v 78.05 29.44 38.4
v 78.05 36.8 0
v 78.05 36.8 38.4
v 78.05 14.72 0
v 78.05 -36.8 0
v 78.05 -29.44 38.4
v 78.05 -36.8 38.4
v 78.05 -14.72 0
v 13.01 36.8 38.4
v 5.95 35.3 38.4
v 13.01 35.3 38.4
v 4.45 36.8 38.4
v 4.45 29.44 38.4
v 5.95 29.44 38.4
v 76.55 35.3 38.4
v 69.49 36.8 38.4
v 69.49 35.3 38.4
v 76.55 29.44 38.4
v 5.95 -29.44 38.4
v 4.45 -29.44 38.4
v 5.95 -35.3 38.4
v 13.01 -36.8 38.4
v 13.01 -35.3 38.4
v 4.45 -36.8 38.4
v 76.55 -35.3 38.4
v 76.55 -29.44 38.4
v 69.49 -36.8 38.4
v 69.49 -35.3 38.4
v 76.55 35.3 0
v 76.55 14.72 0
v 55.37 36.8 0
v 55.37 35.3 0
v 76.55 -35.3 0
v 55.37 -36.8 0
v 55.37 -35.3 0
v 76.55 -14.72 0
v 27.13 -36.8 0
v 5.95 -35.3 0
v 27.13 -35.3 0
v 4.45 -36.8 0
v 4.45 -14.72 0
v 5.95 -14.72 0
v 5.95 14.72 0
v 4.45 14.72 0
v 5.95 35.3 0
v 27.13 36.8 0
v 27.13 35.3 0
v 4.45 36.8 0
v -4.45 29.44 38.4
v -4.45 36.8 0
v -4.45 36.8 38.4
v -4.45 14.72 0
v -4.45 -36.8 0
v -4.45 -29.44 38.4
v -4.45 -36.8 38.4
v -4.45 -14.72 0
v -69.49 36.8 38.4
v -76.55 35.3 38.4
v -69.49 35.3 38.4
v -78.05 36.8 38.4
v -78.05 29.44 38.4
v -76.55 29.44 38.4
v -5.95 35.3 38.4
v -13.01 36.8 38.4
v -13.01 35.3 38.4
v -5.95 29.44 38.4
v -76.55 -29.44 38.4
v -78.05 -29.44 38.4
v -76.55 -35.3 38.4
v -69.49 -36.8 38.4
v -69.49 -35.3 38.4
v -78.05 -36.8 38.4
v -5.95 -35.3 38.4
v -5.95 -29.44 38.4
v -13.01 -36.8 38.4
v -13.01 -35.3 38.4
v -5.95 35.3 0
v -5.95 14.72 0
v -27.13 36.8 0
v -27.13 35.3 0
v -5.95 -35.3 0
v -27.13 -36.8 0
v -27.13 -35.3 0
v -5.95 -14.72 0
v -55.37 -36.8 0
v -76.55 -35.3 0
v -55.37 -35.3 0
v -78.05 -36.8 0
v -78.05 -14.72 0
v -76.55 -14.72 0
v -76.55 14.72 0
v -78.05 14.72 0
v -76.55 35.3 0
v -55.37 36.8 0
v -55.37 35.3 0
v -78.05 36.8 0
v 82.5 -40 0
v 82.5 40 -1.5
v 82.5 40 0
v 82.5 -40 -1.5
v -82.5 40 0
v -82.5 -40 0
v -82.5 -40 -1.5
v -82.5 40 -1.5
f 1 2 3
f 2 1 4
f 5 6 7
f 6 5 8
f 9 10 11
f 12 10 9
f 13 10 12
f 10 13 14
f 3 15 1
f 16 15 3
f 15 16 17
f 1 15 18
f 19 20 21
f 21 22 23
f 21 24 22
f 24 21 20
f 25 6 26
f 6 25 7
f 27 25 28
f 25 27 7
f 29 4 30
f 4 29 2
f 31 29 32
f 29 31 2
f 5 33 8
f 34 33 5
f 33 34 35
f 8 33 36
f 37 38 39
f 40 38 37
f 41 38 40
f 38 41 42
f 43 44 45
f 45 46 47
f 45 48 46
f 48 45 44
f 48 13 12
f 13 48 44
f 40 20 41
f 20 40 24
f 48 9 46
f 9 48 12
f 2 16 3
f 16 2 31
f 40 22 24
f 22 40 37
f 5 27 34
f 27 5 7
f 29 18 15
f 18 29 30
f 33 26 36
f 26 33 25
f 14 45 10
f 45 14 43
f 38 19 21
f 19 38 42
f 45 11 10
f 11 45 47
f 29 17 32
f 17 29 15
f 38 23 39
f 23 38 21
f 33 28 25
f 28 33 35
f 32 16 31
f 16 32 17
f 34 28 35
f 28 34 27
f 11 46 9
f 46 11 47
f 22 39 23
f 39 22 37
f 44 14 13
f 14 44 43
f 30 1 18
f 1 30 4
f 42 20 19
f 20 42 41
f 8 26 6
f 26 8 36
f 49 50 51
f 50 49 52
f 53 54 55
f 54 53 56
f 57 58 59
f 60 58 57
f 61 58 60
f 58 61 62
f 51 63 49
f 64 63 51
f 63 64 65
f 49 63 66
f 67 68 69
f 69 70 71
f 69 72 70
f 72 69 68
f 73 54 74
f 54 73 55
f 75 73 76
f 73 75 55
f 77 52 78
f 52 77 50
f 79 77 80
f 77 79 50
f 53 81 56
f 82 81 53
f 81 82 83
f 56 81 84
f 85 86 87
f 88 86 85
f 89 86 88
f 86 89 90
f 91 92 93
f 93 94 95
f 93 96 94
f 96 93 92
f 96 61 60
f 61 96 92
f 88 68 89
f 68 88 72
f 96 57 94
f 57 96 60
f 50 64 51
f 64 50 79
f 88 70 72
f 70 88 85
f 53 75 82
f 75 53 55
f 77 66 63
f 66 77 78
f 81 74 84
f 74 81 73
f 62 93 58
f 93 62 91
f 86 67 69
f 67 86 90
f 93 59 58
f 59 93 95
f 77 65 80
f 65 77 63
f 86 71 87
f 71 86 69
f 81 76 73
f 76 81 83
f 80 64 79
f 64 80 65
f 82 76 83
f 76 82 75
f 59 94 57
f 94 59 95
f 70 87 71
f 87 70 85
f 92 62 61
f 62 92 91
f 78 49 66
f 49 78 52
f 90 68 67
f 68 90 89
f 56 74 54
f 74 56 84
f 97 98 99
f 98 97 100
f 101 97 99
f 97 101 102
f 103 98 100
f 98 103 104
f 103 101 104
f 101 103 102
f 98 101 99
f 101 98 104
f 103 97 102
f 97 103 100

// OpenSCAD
longueur_boite = 165;
largeur_boite_1 = 80;
largeur_boite_2 = 144;
epaisseur = 1.5;
longueur_tuile = 69.6;
largeur_tuile = 69.6;
nb_tuiles = 16;
longueur_carte_role = 44.9;
largeur_carte_role = 34.8;
nb_carte_role = 6;
longueur_pion = 29.7;
largeur_pion = 16.8;
nb_pion = 6;
longueur_carte_fleche = 24.9;
largeur_carte_fleche = 15.8;
nb_carte_fleche = 6;
longueur_carte_action = 31.7;
largeur_carte_action = 31.7;
nb_carte_action = 4;
longueur_compte_rebour = 140;
largeur_compte_rebour = 60;
longueur_dice = 17.5;
diametre_jeton = 22;
nb_jetons = 6;
epaisseur_carte = 2.4;
espace = 5;
marge = 0.5;
detail = 100;


module plateau(longueur, largeur, epaisseur){
	cube([longueur, largeur, epaisseur], center = true);
}

module bloc_carte(longueur_carte, largeur_carte, hauteur_bloc, epaisseur){
	difference(){
		cube([longueur_carte+2*epaisseur, largeur_carte+2*epaisseur, hauteur_bloc], center=true);
		cube([longueur_carte, largeur_carte, 2*hauteur_bloc], center=true);
		triangle_decoupe(largeur_carte+3*epaisseur, longueur_carte, 2*hauteur_bloc);
		rotate([0,0,90]) triangle_decoupe(longueur_carte+3*epaisseur, largeur_carte+2*epaisseur, 2*hauteur_bloc);
	}
}

module bloc_pieces(longueur, largeur, hauteur, epaisseur){
	difference(){
		cube([longueur+2*epaisseur, largeur+2*epaisseur, hauteur], center=true);
		cube([longueur, largeur, 2*hauteur], center=true);
	}
}

module cylindre_carte(diametre_carte, hauteur_bloc, epaisseur){
	difference(){
		cylinder(h=hauteur_bloc, r=diametre_carte/2+epaisseur, $fn=detail, center=true);
		cylinder(h=2*hauteur_bloc, r=diametre_carte/2, $fn=detail, center=true);
		rectangle_decoupe(diametre_carte+3*epaisseur, (diametre_carte+2*epaisseur)/2, 4*hauteur_bloc);
		rotate([0,0,90]) rectangle_decoupe(diametre_carte+3*epaisseur, (diametre_carte+2*epaisseur)/2, 4*hauteur_bloc);
	}
}

module bloc_compte_rebour(longueur_carte, largeur_carte, hauteur_bloc, hauteur_support, epaisseur){
	difference(){
		bloc_carte(longueur_carte-4*epaisseur, largeur_carte-4*epaisseur, hauteur_bloc+hauteur_support, 3*epaisseur);
		translate([0,0, hauteur_support/2]) cube([longueur_carte,largeur_carte,hauteur_bloc], center=true);
	}
}

module triangle_decoupe(longueur, largeur, hauteur){
	translate([-largeur/2,0,hauteur/2]) rotate([-90,0,0]) linear_extrude(height=longueur, center=true) polygon(points=[[0,0],[largeur,0],[largeur/2,5*hauteur/4]], paths=[[0,1,2]]);
}

module rectangle_decoupe(longueur, largeur, hauteur){
	cube([largeur, longueur, hauteur], center = true);
}

module rangement1(){
	hauteur_bloc = nb_tuiles*epaisseur_carte;
	union(){
		translate([0,0,-epaisseur/2]) plateau(longueur_boite, largeur_boite_1, epaisseur);
		translate([(longueur_tuile+2*marge+2*epaisseur)/2+((longueur_boite/2)-(longueur_tuile+2*marge+2*epaisseur))/2,0,hauteur_bloc/2]) bloc_carte(longueur_tuile+2*marge, largeur_tuile+2*marge, hauteur_bloc, epaisseur);
		translate([-(longueur_tuile+2*marge+2*epaisseur)/2-((longueur_boite/2)-(longueur_tuile+2*marge+2*epaisseur))/2,0,hauteur_bloc/2]) bloc_carte(longueur_tuile+2*marge, largeur_tuile+2*marge, hauteur_bloc, epaisseur);
	}
}

module rangement2(){
	hauteur_support_bloc_compte_rebour = (nb_carte_role+1)*epaisseur_carte;
	hauteur_bloc_carte_role = nb_carte_role*epaisseur_carte;
	longueur_bloc_figurines = (longueur_compte_rebour-2*epaisseur)-(longueur_carte_role+2*epaisseur)-2*espace;
	largeur_bloc_figurines = (largeur_compte_rebour-2*epaisseur)-2*espace;
	largeur_bloc_carte_action = nb_carte_action*epaisseur_carte+2*marge;
	espace_carte_action = (longueur_boite-6*(largeur_bloc_carte_action+2*epaisseur))/7;
	hauteur_bloc_jetons = nb_jetons*epaisseur_carte;
	hauteur_bloc_pion = nb_pion*epaisseur_carte;
	
	position_compte_rebour_y = espace+(largeur_compte_rebour+3*epaisseur-(largeur_boite_2+epaisseur))/2;
	position_carte_role_x = espace+((longueur_carte_role+epaisseur)-(longueur_compte_rebour+3*epaisseur))/2;
	position_carte_role_y = position_compte_rebour_y;
	position_bloc_figurines_x = (longueur_compte_rebour+3*epaisseur)/2 - espace-(longueur_carte_role+epaisseur);
	position_bloc_figurines_y = position_carte_role_y;

	position_carte_action1_x = espace_carte_action+(largeur_bloc_carte_action+2*epaisseur)/2-longueur_boite/2;
	position_carte_action2_x = position_carte_action1_x+espace_carte_action+(largeur_bloc_carte_action+2*epaisseur);
	position_carte_action3_x = position_carte_action2_x+espace_carte_action+(largeur_bloc_carte_action+2*epaisseur);
	position_carte_action4_x = position_carte_action3_x+espace_carte_action+(largeur_bloc_carte_action+2*epaisseur);
	position_carte_action5_x = position_carte_action4_x+espace_carte_action+(largeur_bloc_carte_action+2*epaisseur);
	position_carte_action6_x = position_carte_action5_x+espace_carte_action+(largeur_bloc_carte_action+2*epaisseur);
	position_carte_action_y = largeur_boite_2/2-espace-(longueur_carte_action+2*epaisseur)/2;

	espace_ligne_2 = (longueur_boite-(diametre_jeton+2*epaisseur+2*marge)-(longueur_pion+2*epaisseur+2*marge)-(largeur_carte_fleche+2*epaisseur+2*marge)-(longueur_dice+2*epaisseur+2*marge))/5;
	position_jeton_x = espace_ligne_2+(diametre_jeton+2*epaisseur)/2-longueur_boite/2;
	position_jeton_y = position_carte_action_y-(longueur_carte_action+2*epaisseur)/2-(diametre_jeton+2*epaisseur)/2-espace;
	position_pion_x = position_jeton_x+(diametre_jeton+2*epaisseur+2*marge)/2+(longueur_pion+2*epaisseur+2*marge)/2+espace_ligne_2;
	position_pion_y = position_jeton_y;
	position_carte_fleche_x = position_pion_x+(largeur_pion+2*epaisseur+2*marge)/2+(largeur_carte_fleche+2*epaisseur+2*marge)/2+espace_ligne_2;
	position_carte_fleche_y = position_jeton_y;
	position_dice_x = position_carte_fleche_x+(largeur_carte_fleche+2*epaisseur+2*marge)/2+(longueur_dice+2*epaisseur+2*marge)/2+espace_ligne_2;
	position_dice_y = position_jeton_y;
	
	union(){
		translate([0,0,-epaisseur/2]) plateau(longueur_boite, largeur_boite_2, epaisseur);
		translate([0,position_compte_rebour_y,(nb_carte_role+4)*epaisseur_carte/2]) color("blue") bloc_compte_rebour(longueur_compte_rebour+2*marge, largeur_compte_rebour+2*marge, 3*epaisseur_carte, hauteur_support_bloc_compte_rebour, epaisseur);
		translate([position_carte_role_x,position_carte_role_y,hauteur_bloc_carte_role/2]) rotate([0,0,90]) color("green") bloc_carte(longueur_carte_role+2*marge, largeur_carte_role+2*marge, hauteur_bloc_carte_role, epaisseur);
		translate([position_bloc_figurines_x,position_bloc_figurines_y,hauteur_bloc_carte_role/2]) bloc_pieces(longueur_bloc_figurines, largeur_bloc_figurines, hauteur_bloc_carte_role, epaisseur);

		// Cartes action
		translate([position_carte_action1_x, position_carte_action_y, largeur_carte_action/2]) rotate([0,0,90]) color("red") bloc_carte(longueur_carte_action+2*marge, largeur_bloc_carte_action, largeur_carte_action, epaisseur);
		translate([position_carte_action2_x, position_carte_action_y, largeur_carte_action/2]) rotate([0,0,90]) color("red") bloc_carte(longueur_carte_action+2*marge, largeur_bloc_carte_action, largeur_carte_action, epaisseur);
		translate([position_carte_action3_x, position_carte_action_y, largeur_carte_action/2]) rotate([0,0,90]) color("red") bloc_carte(longueur_carte_action+2*marge, largeur_bloc_carte_action, largeur_carte_action, epaisseur);
		translate([position_carte_action4_x, position_carte_action_y, largeur_carte_action/2]) rotate([0,0,90]) color("red") bloc_carte(longueur_carte_action+2*marge, largeur_bloc_carte_action, largeur_carte_action, epaisseur);
		translate([position_carte_action5_x, position_carte_action_y, largeur_carte_action/2]) rotate([0,0,90]) color("red") bloc_carte(longueur_carte_action+2*marge, largeur_bloc_carte_action, largeur_carte_action, epaisseur);
		translate([position_carte_action6_x, position_carte_action_y, largeur_carte_action/2]) rotate([0,0,90]) color("red") bloc_carte(longueur_carte_action+2*marge, largeur_bloc_carte_action, largeur_carte_action, epaisseur);
		
		// Jeton
		translate([position_jeton_x,position_jeton_y,hauteur_bloc_jetons/2])cylindre_carte(diametre_jeton+2*marge, hauteur_bloc_jetons, epaisseur);
		
		// Cartes pions
		translate([position_pion_x,position_pion_y,hauteur_bloc_pion/2]) bloc_carte(longueur_pion+2*marge, largeur_pion+2*marge, hauteur_bloc_pion, epaisseur);
		
		// Cartes fleches
		translate([position_carte_fleche_x,position_carte_fleche_y,nb_carte_fleche*epaisseur_carte/2]) bloc_carte(longueur_carte_fleche+2*marge, largeur_carte_fleche+2*marge, nb_carte_fleche*epaisseur_carte, epaisseur);
		
		// Dé
		translate([position_dice_x,position_dice_y,longueur_dice/2]) bloc_carte(longueur_dice+2*marge, longueur_dice+2*marge, longueur_dice, epaisseur);
		
	}
}

rangement1();


		
